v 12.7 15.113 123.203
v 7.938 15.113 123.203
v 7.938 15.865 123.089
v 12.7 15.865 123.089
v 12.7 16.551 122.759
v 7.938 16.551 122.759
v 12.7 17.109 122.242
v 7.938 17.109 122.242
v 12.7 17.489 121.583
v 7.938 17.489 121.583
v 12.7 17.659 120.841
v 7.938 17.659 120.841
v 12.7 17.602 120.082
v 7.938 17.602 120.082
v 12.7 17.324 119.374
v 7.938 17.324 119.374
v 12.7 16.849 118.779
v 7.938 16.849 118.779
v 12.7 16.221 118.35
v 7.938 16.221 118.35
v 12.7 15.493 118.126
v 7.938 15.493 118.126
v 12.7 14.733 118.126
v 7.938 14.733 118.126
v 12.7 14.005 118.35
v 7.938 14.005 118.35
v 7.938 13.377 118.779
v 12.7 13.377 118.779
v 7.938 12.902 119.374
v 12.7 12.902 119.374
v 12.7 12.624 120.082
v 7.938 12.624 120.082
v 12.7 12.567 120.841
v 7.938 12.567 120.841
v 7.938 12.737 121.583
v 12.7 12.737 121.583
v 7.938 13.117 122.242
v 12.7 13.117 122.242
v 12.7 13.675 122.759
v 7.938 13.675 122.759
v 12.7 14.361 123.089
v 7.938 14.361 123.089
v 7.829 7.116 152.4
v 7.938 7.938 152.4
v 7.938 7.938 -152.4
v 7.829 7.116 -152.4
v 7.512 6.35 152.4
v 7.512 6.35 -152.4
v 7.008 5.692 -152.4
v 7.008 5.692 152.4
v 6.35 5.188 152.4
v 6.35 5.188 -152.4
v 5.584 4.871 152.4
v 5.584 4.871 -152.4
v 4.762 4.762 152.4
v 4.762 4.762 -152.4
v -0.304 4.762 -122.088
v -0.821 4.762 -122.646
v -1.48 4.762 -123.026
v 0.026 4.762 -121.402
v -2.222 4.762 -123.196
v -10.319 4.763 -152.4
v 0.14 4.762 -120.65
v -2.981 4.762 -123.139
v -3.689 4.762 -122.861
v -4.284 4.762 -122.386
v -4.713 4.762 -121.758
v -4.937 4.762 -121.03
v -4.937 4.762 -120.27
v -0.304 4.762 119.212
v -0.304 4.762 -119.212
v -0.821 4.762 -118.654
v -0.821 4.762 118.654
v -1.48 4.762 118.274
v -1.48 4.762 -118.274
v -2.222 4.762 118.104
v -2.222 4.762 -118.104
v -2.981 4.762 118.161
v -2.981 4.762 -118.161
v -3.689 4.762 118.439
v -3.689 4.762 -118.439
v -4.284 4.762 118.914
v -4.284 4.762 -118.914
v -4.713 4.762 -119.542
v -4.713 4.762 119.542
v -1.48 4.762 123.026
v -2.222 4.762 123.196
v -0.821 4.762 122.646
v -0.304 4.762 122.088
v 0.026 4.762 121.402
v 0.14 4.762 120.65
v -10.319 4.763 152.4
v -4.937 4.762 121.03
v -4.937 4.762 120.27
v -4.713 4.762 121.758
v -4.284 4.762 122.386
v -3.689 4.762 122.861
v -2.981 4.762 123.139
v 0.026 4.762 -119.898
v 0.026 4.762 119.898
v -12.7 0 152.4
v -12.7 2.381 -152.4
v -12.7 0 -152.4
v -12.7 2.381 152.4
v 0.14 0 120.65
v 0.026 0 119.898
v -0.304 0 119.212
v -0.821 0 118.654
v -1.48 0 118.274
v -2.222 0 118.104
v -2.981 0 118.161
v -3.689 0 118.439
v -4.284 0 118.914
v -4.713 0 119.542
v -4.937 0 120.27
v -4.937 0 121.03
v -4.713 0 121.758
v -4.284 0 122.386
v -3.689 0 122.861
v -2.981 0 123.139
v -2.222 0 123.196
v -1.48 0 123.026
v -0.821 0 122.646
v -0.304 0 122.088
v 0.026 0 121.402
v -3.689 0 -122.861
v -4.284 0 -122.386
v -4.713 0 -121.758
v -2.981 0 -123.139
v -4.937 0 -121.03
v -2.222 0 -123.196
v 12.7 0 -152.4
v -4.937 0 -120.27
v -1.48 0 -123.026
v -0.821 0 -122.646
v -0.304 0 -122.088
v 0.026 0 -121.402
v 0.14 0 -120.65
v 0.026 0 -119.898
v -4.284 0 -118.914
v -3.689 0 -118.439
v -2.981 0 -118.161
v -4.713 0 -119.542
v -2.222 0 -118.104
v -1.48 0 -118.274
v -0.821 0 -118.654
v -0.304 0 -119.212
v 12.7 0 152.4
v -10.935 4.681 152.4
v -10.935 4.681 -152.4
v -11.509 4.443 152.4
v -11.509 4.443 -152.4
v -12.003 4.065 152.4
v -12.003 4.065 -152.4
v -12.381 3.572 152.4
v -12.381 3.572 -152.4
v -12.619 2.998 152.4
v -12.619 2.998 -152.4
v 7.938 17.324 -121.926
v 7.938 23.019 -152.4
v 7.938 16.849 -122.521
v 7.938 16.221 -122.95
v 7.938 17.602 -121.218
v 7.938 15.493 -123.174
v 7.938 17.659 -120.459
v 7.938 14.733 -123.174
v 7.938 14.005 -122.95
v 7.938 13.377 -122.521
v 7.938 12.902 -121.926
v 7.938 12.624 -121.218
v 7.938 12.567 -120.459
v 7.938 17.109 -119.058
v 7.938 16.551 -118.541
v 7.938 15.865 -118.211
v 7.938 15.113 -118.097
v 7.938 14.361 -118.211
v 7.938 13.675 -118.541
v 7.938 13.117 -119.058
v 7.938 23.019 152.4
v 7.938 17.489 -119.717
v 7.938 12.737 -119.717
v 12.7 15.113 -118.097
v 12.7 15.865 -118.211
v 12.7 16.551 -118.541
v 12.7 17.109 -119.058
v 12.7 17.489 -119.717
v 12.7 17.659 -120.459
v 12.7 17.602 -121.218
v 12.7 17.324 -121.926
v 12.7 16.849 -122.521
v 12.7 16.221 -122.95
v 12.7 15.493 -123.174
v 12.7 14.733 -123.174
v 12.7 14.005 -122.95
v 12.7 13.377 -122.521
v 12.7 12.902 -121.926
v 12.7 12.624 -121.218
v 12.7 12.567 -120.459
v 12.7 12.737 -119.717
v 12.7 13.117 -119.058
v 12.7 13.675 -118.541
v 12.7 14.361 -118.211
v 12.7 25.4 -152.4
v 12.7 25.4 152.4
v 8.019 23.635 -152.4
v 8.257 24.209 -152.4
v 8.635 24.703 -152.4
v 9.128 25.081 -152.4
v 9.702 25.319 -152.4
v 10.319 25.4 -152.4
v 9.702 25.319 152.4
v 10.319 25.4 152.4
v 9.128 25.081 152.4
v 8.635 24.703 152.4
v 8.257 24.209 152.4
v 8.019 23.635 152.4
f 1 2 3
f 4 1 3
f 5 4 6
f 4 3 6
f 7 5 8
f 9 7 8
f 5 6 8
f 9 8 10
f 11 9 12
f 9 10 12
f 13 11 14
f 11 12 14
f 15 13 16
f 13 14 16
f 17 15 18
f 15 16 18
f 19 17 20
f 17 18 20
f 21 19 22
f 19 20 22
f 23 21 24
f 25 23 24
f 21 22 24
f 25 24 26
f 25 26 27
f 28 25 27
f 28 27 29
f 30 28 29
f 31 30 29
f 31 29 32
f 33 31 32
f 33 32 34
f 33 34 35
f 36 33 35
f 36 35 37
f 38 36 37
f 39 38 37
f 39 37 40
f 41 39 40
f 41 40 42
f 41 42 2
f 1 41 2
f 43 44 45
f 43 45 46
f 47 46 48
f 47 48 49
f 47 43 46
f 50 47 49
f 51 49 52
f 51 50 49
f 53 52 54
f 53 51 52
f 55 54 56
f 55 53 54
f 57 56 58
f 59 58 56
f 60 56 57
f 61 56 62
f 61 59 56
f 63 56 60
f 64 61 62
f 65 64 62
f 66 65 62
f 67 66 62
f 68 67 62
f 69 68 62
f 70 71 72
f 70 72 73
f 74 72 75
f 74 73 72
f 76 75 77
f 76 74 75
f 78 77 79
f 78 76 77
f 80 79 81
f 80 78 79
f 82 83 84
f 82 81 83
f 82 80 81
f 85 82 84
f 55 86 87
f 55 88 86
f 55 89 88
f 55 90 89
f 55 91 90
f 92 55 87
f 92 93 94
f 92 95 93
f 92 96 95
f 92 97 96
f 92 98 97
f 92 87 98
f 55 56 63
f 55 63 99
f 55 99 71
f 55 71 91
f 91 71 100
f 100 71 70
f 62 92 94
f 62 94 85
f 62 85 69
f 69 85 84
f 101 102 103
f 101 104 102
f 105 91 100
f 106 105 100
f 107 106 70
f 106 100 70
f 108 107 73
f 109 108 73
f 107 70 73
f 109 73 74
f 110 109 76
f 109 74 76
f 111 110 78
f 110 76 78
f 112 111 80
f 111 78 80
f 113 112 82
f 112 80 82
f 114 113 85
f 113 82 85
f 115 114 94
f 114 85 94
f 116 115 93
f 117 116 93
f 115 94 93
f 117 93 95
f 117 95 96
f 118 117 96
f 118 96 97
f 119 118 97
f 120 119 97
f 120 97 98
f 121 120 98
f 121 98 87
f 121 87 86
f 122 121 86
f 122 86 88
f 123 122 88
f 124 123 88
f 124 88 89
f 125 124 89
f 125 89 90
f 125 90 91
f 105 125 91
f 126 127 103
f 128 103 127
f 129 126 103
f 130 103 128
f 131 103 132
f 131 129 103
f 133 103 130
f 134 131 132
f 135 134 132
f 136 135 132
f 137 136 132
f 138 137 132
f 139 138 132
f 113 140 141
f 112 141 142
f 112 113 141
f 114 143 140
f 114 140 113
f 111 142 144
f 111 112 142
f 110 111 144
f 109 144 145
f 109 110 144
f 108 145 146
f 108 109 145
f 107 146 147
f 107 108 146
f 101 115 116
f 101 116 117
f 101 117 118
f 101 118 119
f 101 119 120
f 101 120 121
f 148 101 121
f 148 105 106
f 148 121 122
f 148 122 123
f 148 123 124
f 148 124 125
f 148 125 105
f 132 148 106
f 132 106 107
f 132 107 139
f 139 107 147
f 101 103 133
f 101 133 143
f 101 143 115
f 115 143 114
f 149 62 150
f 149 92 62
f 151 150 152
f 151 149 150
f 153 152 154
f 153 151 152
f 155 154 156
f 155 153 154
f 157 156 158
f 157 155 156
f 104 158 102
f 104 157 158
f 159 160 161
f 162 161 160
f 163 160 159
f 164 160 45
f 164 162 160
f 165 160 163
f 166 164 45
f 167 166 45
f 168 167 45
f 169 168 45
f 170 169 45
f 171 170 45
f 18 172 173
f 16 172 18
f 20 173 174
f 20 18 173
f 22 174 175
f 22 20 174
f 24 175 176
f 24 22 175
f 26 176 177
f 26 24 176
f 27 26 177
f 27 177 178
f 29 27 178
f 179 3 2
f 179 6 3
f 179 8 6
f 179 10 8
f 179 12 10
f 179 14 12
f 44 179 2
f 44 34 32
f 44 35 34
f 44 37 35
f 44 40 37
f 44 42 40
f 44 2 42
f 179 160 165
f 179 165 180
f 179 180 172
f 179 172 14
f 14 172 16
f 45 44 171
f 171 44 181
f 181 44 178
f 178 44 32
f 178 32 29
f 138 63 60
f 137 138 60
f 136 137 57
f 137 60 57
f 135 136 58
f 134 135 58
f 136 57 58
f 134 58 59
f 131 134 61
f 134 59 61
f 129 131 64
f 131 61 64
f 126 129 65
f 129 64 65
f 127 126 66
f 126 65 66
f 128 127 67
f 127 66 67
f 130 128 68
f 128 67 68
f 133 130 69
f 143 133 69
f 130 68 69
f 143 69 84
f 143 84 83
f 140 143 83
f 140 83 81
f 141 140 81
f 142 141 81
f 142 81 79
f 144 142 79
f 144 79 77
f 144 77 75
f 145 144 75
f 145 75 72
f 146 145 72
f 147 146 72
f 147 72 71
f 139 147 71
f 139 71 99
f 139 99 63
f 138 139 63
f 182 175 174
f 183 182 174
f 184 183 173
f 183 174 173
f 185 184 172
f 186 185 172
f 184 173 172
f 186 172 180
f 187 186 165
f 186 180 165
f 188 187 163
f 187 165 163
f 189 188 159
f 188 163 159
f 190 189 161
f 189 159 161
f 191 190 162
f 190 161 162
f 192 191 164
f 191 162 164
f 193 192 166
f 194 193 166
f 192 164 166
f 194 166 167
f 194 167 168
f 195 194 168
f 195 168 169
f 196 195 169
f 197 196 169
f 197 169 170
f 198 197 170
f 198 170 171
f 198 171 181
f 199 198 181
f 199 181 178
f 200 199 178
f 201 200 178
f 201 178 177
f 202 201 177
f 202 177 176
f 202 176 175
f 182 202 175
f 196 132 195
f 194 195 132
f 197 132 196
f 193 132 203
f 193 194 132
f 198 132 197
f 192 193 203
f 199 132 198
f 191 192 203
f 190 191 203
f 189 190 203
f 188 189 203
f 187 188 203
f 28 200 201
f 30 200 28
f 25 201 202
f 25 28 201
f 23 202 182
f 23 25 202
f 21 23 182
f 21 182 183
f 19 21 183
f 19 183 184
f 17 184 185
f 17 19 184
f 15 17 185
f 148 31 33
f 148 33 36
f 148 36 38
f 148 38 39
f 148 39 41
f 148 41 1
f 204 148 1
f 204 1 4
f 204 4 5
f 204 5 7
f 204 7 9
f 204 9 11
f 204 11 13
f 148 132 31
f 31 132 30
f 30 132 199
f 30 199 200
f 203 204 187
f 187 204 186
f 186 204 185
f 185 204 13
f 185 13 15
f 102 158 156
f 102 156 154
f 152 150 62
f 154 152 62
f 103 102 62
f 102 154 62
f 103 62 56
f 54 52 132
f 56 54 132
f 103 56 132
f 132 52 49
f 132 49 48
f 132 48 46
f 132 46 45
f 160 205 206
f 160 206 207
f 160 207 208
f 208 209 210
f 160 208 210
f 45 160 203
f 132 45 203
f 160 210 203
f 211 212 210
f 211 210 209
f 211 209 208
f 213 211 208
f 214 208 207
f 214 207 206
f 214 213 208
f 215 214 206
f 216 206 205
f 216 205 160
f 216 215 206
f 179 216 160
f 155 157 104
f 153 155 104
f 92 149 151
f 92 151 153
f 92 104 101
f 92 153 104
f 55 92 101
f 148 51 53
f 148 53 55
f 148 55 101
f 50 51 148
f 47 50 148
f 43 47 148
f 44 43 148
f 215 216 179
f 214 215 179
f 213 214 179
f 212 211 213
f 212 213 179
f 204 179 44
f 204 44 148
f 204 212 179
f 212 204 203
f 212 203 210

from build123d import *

# Parameters (mm, degrees)
BOSS_EXTRUDE1_DEPTH    = 152.4
F_10_CLEARANCE_HOLE2_D = 5.1054
F_10_CLEARANCE_HOLE3_D = 5.1054


with BuildPart() as part:
    # Sketch2 → Boss-Extrude1 (new, symmetric)
    with BuildSketch(Plane.XY):
        with BuildLine():
            Line((-12.7, 0), (12.7, 0))
            Line((12.7, 0), (12.7, 25.4))
            Line((12.7, 25.4), (10.31875, 25.4))
            ThreePointArc((10.31875, 25.4), (8.634951977, 24.702548023), (7.9375, 23.01875))
            Line((7.9375, 23.01875), (7.9375, 7.9375))
            ThreePointArc((7.9375, 7.9375), (7.00756403, 5.69243597), (4.7625, 4.7625))
            Line((4.7625, 4.7625), (-10.31875, 4.7625))
            ThreePointArc((-10.31875, 4.7625), (-12.002548023, 4.065048023), (-12.7, 2.38125))
            Line((-12.7, 2.38125), (-12.7, 0))
        make_face()
    extrude(amount=BOSS_EXTRUDE1_DEPTH, both=True)

    # #10 Clearance Hole2 (through all)
    with Locations(Plane(origin=(12.7, 0, 0), x_dir=(0, 0, -1), z_dir=(1, 0, 0))):
        with Locations((-120.65, 15.113), (120.65, 15.113)):
            Hole(F_10_CLEARANCE_HOLE2_D / 2)

    # #10 Clearance Hole3 (through all)
    with Locations(Plane(origin=(0, 0, 0), x_dir=(-1, 0, 0), z_dir=(0, -1, 0))):
        with Locations((2.413, -120.65), (2.413, 120.65)):
            Hole(F_10_CLEARANCE_HOLE3_D / 2)


solid = part.part
